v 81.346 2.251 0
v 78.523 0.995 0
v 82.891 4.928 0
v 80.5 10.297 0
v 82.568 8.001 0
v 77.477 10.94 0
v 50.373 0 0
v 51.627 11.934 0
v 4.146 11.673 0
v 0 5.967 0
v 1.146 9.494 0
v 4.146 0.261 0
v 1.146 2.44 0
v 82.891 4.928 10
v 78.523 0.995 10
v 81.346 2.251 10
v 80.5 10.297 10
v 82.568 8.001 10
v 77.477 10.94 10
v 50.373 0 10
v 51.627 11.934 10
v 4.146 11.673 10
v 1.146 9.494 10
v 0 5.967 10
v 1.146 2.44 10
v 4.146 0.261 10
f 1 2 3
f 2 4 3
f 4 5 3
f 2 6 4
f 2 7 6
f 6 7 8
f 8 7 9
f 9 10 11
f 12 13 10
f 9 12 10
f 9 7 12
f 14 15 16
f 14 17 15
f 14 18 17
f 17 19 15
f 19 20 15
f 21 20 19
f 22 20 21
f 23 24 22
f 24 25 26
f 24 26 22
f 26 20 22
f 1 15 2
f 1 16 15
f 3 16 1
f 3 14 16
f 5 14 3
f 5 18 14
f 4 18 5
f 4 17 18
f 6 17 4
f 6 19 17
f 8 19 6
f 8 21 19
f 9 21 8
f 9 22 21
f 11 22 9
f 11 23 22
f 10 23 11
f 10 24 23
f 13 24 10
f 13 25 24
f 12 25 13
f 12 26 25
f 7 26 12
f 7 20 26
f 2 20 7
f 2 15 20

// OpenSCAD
$fn = 32;

// ----------------------------------------------------------------------
// Lever arm: two bosses 12 and 12 mm, 45 mm between centres
// ----------------------------------------------------------------------

// --- parameters (mm) ---
profile_height = 10;      // extrusion height
profile_points = 13;      // points of the closed outline

profile = [[0, 5.967], [1.146, 2.44], [4.146, 0.261], [50.373, 0], [78.523, 0.995], [81.346, 2.251], [82.891, 4.928], [82.568, 8.001], [80.5, 10.297], [77.477, 10.94], [51.627, 11.934], [4.146, 11.673], [1.146, 9.494]];  // single closed polygon, 13 points, counter clockwise

// --- the one profile operation ---
linear_extrude(height = profile_height) polygon(points = profile);
